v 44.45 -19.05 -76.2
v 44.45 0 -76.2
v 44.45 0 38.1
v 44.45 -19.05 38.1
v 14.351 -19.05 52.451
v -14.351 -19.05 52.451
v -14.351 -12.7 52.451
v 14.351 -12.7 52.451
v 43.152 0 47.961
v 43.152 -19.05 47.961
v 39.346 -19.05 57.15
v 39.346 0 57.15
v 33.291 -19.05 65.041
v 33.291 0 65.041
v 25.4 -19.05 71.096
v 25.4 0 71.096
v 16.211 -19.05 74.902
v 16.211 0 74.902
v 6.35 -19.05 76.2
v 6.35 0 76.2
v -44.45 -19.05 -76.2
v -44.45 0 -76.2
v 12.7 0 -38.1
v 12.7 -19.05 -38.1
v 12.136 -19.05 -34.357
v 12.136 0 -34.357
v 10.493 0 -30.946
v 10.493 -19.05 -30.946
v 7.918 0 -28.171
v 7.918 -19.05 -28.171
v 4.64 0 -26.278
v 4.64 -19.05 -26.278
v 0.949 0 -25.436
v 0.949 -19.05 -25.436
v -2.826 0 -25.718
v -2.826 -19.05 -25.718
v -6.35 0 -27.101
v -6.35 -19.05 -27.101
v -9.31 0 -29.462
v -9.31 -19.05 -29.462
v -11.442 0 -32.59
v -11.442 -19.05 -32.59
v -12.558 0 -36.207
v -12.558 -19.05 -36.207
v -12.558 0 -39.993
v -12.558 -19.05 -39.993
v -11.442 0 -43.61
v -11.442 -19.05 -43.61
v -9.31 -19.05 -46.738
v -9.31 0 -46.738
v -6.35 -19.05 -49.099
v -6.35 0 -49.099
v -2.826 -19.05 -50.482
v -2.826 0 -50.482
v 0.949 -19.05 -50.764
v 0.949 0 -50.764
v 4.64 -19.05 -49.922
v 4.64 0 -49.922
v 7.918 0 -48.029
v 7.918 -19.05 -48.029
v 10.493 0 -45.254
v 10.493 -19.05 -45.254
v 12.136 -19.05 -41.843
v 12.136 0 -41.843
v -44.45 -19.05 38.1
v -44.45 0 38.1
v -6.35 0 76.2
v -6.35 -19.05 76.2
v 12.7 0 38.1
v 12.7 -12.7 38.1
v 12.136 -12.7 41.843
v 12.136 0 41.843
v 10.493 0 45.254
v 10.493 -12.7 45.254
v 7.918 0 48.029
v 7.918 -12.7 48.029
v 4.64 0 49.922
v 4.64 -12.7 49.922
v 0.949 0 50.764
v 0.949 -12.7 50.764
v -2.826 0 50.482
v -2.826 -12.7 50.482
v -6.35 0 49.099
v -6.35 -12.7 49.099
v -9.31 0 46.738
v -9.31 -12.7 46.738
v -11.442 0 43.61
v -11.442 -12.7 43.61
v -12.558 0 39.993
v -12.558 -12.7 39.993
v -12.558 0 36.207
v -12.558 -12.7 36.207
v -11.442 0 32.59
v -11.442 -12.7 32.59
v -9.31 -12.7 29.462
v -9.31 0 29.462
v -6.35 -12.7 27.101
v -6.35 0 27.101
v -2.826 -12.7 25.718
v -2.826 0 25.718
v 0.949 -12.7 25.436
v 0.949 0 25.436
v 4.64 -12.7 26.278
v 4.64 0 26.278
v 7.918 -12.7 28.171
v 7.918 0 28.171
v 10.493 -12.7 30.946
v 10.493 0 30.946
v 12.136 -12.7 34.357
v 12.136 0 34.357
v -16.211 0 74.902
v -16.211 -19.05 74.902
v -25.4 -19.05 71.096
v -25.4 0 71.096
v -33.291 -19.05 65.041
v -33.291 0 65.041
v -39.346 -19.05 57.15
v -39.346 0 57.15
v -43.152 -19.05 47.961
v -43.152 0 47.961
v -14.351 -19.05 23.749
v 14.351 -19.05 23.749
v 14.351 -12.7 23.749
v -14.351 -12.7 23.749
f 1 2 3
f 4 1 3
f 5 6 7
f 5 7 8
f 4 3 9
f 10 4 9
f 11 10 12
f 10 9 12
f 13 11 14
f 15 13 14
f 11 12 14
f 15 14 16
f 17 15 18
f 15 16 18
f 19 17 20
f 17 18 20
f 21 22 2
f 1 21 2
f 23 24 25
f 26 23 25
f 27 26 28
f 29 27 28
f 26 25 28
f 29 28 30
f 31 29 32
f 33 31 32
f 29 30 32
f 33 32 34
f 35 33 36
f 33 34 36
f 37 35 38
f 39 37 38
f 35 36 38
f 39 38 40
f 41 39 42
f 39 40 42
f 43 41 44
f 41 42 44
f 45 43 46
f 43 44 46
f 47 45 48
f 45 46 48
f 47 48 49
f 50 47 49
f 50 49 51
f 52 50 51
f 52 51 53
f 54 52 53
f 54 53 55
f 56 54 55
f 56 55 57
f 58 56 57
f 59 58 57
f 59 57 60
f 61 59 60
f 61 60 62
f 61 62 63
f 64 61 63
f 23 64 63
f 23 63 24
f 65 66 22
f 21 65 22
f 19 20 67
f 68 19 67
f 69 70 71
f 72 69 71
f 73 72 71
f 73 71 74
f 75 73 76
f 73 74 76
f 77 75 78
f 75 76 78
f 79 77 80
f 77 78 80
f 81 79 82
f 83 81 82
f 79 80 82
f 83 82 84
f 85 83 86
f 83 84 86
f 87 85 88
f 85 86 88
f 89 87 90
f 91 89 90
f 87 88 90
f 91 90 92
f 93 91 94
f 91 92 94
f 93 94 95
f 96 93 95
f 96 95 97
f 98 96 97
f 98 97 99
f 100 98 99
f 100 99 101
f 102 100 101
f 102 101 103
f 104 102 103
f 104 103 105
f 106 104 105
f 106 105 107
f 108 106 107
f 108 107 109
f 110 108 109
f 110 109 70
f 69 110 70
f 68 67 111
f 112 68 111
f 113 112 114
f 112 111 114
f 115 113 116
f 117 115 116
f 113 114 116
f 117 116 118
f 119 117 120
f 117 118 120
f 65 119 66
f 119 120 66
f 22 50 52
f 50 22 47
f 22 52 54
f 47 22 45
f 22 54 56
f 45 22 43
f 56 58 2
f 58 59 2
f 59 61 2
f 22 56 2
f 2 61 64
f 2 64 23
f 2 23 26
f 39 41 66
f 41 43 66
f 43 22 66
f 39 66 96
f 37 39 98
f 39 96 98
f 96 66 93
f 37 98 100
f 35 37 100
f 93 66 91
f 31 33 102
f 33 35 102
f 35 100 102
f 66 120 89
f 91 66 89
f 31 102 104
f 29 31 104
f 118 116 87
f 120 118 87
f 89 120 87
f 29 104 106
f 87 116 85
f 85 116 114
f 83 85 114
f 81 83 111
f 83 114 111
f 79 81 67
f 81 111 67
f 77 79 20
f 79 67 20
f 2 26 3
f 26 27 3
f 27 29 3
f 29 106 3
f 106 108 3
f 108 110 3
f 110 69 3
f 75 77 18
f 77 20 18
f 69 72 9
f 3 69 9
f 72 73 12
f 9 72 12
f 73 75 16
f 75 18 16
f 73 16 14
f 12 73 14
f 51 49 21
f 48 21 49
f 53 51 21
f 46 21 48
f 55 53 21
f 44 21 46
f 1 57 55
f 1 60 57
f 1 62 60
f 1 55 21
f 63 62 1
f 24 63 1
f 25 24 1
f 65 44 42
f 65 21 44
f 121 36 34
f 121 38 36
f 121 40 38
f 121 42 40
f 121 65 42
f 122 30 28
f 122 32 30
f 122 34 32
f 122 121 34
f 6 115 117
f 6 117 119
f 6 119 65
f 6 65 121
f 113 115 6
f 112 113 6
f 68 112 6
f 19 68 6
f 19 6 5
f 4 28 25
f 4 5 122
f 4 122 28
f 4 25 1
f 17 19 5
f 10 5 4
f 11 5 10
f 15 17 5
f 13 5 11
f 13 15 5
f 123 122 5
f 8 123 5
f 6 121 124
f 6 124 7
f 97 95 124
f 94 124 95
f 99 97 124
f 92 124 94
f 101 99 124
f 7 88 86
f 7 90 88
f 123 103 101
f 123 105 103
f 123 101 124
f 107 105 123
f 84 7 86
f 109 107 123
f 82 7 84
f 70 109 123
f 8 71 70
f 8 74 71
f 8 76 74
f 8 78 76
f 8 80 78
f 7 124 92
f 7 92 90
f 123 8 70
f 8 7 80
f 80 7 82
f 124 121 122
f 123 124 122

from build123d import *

# Parameters (mm, degrees)
F1_DEPTH = 19.05
F2_R     = 12.7
F3_DEPTH = 19.051
F4_W     = 28.702
F4_H     = 28.702
F4_R     = 12.7
F5_DEPTH = 6.35


with BuildPart() as f1:
    # F0 (on Front) → F1 (new body)
    with BuildSketch(Plane.XZ):
        with BuildLine():
            Line((-44.45, 38.1), (-44.45, -76.2))
            Line((-44.45, -76.2), (44.45, -76.2))
            Line((44.45, -76.2), (44.45, 38.1))
            ThreePointArc((44.45, 38.1), (33.290768, 65.040768), (6.35, 76.2))
            Line((6.35, 76.2), (-6.35, 76.2))
            ThreePointArc((-6.35, 76.2), (-33.290768, 65.040768), (-44.45, 38.1))
        make_face()
    extrude(amount=F1_DEPTH)

    # F2 (on face) → F3 (cut, through all)
    with BuildSketch(Plane.XZ.offset(19.05)):
        with Locations((0, -38.1)):
            Circle(F2_R)
        with Locations((0, 38.1)):
            Circle(F2_R)
    extrude(amount=-F3_DEPTH, mode=Mode.SUBTRACT)

    # F4 (on face) → F5 (cut)
    with BuildSketch(Plane.XZ.offset(19.05)):
        with Locations((0, 38.1)):
            Rectangle(F4_W, F4_H)
        with Locations((0, 38.1)):
            Circle(F4_R, mode=Mode.SUBTRACT)
    extrude(amount=-F5_DEPTH, mode=Mode.SUBTRACT)


solid = f1.part
